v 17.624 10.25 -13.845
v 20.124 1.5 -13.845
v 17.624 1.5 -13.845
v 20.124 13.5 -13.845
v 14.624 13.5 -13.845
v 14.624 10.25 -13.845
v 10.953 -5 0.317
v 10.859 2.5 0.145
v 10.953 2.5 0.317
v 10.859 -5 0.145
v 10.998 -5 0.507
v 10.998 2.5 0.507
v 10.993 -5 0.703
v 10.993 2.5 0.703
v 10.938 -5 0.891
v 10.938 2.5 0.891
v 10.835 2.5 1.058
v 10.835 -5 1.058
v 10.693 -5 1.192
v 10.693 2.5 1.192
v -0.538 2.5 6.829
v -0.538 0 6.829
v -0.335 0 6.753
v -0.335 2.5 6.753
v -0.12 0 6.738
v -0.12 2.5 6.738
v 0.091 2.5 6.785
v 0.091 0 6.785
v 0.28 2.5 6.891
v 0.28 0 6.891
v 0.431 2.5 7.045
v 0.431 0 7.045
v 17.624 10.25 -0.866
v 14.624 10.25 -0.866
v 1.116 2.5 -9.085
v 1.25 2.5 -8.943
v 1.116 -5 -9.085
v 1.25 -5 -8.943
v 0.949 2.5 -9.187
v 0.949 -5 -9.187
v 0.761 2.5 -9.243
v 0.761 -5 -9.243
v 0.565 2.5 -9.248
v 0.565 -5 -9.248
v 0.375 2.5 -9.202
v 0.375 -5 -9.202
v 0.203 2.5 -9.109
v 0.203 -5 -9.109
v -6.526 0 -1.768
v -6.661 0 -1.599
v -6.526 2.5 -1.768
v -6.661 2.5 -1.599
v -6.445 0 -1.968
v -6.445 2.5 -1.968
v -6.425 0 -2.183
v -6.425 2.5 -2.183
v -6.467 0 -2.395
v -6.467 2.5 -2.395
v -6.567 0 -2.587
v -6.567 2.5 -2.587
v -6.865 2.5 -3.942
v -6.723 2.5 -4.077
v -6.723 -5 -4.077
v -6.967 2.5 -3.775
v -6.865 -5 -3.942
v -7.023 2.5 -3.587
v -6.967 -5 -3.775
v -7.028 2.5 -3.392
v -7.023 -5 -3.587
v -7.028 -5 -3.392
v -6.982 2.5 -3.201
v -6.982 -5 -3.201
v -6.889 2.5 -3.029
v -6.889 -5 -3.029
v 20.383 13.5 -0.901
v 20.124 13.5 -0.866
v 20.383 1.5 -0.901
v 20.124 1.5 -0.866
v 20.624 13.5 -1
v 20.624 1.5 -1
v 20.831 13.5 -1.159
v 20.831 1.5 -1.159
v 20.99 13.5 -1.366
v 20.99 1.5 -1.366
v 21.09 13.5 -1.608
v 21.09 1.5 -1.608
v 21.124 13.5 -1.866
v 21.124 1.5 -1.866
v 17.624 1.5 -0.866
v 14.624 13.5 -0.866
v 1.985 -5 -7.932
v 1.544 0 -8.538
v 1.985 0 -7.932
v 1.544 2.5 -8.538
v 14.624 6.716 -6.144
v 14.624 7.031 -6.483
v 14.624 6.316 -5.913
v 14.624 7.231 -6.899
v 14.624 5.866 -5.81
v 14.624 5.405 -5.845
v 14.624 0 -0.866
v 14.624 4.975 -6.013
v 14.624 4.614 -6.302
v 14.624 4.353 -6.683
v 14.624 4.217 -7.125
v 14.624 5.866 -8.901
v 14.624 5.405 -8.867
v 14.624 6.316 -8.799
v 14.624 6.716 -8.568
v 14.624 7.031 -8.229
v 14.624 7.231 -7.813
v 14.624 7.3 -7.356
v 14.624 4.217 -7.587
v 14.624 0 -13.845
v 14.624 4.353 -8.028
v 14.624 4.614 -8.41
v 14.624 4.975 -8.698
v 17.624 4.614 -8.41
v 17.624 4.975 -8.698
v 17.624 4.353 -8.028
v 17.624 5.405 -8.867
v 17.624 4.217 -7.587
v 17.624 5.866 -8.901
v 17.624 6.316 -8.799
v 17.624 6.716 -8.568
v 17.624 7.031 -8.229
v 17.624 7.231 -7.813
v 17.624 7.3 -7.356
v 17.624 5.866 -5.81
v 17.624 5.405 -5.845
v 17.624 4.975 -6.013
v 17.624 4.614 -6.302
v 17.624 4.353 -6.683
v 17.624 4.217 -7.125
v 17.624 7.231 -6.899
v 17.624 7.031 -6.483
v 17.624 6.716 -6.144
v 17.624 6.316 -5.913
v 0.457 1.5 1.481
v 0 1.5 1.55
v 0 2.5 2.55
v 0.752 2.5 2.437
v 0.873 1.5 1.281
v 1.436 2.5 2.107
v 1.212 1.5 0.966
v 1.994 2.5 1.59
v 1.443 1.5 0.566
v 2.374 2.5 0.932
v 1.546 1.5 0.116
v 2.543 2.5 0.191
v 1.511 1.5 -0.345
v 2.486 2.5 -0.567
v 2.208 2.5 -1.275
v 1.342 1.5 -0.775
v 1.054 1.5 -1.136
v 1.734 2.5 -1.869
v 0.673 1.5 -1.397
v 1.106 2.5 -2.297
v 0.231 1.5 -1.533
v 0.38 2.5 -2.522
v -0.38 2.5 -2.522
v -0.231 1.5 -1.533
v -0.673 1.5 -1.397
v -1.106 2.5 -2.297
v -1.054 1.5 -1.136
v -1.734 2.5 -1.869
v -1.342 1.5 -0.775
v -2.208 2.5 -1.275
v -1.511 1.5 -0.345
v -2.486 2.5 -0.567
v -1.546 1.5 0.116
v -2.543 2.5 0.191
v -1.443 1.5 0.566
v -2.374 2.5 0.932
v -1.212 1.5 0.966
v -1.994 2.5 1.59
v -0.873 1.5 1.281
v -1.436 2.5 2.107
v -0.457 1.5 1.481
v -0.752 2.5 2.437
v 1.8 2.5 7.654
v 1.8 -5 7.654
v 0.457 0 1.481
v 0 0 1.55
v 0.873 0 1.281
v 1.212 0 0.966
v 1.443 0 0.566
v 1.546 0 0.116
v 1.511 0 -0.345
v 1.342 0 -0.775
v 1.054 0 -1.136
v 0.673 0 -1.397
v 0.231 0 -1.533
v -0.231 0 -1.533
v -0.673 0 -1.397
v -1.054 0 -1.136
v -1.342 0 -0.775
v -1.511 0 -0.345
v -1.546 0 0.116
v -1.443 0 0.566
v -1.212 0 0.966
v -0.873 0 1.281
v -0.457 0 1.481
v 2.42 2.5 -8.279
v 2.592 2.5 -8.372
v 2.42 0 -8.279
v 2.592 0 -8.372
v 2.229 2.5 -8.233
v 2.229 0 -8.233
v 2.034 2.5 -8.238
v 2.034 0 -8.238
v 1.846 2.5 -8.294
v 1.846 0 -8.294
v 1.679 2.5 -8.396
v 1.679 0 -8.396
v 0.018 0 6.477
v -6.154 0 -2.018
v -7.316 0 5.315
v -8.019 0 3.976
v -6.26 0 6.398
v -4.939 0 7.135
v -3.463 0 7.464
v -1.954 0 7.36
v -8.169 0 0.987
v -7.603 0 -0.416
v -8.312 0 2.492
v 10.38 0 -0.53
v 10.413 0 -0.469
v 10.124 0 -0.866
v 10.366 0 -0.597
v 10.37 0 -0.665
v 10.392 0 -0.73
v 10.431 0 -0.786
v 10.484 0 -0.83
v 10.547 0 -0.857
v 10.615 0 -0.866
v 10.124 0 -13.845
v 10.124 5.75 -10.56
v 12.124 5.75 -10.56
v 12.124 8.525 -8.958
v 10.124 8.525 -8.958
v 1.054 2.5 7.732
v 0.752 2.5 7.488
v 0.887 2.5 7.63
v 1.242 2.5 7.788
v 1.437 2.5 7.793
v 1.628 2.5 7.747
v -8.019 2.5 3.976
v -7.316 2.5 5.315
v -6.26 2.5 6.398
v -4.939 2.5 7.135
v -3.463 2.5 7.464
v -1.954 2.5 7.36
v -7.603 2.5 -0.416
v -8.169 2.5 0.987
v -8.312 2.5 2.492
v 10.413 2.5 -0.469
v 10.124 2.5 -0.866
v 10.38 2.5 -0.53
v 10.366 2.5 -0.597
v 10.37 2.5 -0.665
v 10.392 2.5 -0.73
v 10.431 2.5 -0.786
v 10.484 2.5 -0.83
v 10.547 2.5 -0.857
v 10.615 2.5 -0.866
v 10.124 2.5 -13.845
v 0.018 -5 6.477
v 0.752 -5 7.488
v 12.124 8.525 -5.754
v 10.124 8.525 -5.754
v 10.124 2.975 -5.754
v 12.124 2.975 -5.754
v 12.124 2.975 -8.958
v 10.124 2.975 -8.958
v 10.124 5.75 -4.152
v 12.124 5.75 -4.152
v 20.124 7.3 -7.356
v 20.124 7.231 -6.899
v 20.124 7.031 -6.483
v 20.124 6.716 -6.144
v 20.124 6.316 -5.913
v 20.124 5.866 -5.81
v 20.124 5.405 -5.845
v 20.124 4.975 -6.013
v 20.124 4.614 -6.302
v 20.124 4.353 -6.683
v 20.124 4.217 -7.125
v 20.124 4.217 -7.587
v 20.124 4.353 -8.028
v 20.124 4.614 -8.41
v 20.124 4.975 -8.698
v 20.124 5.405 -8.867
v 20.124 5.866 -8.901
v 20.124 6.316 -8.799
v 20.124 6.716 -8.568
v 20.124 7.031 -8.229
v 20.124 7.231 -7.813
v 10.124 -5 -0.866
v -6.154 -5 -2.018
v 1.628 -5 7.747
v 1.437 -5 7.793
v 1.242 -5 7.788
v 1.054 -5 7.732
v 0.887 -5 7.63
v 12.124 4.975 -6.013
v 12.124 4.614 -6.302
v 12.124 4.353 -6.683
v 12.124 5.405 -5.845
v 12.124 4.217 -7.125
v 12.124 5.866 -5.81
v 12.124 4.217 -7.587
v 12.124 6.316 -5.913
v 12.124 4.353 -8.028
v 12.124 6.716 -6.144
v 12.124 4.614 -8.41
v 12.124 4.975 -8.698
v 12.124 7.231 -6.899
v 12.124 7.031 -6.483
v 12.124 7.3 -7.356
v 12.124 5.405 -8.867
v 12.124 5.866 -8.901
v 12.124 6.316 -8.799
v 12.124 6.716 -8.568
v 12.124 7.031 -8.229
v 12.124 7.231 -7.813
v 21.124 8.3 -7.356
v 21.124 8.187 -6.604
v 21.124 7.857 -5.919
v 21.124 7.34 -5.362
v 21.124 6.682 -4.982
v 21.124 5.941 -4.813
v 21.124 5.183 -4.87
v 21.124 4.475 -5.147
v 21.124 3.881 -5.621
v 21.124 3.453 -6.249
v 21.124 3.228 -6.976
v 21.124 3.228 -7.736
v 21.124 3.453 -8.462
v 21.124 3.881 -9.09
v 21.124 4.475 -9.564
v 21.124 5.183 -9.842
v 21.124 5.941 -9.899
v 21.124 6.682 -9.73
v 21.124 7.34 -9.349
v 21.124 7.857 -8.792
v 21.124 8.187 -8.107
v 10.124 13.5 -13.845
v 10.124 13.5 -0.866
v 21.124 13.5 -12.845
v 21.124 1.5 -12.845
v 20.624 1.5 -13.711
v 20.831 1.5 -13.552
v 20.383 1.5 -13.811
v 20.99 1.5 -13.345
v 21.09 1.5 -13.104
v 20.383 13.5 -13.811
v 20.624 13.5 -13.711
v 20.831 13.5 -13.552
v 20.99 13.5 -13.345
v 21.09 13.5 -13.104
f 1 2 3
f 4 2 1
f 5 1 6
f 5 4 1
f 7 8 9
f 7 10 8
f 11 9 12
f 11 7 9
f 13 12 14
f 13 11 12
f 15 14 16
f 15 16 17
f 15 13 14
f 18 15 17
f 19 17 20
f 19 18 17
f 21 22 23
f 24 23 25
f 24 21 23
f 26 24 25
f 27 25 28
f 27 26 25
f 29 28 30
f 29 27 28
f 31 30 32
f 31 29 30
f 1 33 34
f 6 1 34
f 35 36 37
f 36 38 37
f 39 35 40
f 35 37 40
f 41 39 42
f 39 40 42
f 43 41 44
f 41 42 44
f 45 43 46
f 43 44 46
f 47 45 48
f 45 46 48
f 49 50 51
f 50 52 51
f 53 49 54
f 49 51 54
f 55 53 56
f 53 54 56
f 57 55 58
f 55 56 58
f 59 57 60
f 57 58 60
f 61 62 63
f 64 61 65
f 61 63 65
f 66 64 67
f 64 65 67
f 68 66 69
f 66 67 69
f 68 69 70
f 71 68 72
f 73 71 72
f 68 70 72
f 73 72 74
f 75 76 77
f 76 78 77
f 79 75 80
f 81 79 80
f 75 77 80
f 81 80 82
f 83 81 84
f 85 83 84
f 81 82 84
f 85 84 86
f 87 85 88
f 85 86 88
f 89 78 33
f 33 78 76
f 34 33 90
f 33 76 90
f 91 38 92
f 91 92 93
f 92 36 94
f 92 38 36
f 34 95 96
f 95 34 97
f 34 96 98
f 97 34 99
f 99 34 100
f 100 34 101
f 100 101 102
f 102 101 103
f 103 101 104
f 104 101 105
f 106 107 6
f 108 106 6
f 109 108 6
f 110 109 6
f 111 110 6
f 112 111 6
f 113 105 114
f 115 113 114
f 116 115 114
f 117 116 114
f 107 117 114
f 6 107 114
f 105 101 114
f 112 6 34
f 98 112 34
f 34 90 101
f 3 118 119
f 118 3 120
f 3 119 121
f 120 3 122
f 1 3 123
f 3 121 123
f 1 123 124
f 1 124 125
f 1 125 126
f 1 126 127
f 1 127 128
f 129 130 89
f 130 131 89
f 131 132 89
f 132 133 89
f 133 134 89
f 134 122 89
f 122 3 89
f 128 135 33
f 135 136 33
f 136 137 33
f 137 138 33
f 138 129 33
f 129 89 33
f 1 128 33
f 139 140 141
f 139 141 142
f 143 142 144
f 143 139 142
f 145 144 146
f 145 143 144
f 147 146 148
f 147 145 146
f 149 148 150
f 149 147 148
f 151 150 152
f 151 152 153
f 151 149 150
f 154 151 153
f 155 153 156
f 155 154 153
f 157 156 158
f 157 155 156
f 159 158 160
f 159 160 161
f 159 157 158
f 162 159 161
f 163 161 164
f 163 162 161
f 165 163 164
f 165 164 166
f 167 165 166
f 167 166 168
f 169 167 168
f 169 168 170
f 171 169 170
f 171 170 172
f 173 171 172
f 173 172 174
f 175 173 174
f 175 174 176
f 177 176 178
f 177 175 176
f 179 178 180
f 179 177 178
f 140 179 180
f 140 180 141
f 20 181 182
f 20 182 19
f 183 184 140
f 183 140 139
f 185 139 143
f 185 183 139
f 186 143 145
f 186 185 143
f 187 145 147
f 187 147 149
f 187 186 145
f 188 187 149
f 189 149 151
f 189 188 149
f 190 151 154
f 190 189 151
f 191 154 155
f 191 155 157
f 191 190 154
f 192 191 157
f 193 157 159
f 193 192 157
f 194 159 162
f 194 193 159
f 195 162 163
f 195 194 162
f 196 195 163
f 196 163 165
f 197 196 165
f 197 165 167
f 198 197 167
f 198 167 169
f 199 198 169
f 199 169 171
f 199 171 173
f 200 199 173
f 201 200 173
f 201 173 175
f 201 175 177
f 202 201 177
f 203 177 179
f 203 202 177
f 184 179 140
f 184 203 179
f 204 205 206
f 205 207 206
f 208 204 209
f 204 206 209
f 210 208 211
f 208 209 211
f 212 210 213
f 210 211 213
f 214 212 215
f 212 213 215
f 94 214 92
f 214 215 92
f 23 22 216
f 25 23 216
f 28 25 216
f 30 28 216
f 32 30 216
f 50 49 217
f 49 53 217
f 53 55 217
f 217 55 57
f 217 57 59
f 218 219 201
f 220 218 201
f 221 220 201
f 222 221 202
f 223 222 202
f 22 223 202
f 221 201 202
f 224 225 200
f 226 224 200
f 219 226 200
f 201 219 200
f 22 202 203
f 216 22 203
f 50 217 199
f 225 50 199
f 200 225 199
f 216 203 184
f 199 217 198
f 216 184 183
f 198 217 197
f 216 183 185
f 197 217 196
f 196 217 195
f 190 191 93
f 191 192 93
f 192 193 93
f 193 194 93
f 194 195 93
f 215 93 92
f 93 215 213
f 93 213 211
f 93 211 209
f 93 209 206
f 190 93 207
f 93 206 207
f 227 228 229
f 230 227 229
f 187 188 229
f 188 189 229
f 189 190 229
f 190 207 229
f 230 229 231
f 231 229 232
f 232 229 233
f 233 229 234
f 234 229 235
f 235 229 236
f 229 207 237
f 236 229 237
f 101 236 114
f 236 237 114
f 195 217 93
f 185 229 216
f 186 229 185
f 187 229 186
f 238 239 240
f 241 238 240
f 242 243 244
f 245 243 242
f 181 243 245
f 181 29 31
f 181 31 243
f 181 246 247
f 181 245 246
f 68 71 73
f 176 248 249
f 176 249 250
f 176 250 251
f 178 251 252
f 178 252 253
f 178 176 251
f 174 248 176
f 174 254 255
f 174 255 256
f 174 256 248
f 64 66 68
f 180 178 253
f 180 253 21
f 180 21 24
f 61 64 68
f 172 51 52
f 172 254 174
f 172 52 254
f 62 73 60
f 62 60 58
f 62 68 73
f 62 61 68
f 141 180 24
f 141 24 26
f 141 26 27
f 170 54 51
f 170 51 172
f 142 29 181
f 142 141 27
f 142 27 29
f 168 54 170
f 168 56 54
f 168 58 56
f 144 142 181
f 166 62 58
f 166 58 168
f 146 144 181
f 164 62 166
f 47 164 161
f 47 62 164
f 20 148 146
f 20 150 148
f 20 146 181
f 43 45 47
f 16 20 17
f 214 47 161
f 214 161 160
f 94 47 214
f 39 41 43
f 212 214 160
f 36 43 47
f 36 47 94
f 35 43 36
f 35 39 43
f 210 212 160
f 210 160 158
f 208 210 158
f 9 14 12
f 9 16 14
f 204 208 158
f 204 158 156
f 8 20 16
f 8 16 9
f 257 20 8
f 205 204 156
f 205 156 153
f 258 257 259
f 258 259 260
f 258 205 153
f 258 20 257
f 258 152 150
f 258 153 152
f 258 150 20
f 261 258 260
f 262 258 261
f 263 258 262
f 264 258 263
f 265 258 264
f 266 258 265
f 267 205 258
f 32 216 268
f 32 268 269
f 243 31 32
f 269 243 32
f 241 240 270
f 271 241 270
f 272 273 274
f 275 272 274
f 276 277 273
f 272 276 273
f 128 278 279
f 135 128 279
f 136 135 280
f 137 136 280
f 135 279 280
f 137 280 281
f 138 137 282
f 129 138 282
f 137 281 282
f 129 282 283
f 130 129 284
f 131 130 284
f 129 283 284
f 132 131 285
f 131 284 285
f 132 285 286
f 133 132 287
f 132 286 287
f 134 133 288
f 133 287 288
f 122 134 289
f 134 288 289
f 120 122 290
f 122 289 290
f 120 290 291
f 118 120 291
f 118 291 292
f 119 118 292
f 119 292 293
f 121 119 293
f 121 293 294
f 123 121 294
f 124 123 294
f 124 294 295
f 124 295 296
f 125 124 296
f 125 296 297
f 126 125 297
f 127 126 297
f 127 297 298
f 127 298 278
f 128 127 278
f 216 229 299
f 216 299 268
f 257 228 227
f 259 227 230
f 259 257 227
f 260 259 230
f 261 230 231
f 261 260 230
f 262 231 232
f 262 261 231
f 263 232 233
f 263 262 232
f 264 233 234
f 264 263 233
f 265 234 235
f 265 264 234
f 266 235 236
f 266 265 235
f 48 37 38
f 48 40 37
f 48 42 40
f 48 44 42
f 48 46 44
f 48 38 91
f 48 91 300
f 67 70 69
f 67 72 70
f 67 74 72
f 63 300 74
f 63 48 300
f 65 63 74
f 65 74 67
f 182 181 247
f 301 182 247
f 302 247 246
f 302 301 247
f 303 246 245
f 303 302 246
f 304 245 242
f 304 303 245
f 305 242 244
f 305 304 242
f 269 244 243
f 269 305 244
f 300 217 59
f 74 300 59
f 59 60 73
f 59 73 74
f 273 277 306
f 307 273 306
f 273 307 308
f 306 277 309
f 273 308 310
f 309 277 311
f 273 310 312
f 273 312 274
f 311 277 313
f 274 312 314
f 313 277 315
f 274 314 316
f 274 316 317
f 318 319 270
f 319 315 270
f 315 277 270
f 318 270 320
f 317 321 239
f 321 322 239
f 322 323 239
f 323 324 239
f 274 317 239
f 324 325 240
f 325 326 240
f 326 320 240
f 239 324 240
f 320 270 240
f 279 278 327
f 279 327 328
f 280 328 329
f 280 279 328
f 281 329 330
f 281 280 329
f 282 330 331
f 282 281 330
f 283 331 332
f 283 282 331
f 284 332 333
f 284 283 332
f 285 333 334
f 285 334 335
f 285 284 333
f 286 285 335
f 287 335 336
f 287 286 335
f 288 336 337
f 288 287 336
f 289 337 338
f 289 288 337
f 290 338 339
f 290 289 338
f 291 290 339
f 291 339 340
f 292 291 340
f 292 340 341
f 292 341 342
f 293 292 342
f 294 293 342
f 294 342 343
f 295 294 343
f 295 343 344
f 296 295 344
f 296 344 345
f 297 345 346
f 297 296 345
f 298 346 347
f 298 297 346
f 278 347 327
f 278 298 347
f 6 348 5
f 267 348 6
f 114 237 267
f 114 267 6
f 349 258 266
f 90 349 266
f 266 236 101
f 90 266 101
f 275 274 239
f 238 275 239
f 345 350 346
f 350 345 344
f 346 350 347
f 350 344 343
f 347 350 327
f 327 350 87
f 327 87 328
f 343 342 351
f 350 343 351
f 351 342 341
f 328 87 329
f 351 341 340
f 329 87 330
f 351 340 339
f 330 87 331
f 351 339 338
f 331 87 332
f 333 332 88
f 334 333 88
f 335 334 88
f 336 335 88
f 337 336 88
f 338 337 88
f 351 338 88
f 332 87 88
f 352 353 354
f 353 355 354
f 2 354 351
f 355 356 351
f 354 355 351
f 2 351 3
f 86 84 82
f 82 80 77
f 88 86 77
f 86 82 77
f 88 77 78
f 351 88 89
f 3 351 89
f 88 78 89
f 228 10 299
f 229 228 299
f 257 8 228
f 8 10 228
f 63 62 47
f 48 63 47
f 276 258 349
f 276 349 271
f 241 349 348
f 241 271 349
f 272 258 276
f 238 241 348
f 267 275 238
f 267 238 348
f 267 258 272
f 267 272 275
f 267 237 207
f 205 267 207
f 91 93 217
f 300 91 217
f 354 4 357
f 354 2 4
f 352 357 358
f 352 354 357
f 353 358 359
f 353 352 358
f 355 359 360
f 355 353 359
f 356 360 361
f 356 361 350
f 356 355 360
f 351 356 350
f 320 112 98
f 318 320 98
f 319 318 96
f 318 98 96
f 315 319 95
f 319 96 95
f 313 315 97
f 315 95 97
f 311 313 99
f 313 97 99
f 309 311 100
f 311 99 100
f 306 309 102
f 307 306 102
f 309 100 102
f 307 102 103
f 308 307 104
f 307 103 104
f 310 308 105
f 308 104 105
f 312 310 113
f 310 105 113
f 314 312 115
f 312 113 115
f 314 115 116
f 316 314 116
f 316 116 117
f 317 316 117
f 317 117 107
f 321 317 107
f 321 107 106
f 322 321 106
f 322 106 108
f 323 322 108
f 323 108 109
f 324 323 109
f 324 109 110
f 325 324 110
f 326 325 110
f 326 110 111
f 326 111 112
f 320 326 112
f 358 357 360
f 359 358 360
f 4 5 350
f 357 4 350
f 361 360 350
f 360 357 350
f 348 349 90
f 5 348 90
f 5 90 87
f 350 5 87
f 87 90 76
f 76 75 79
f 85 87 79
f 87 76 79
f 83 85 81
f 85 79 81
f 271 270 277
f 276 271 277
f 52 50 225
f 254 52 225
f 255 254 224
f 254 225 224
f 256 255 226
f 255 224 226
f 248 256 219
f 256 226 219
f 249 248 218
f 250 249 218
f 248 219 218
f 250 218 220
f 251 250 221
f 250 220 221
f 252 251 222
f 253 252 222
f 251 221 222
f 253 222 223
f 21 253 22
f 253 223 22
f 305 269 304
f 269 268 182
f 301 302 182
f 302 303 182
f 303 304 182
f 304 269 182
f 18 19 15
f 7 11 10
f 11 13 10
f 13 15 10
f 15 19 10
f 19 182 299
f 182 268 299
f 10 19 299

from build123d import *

# Parameters (mm, degrees)
SKETCH_1_R             = 1.55
EXTRUDE_386_DEPTH      = 2.5
EXTRUDE_START          = 2.5
EXTRUDE_629_DEPTH      = 7.5
SKETCH_3_W             = 4.5
SKETCH_3_H             = 12.978713764
EXTRUDE_1_DEPTH        = 13.5
EXTRUDE_START_2        = -0.866441
EXTRUDE_2_DEPTH        = 12.978713764
SKETCH_5_R             = 1.55
CUT_EXTRUDE_1293_DEPTH = 36.225185951
CUT_EXTRUDE_START      = -9
SKETCH_5_3_R           = 1.55
CUT_EXTRUDE_1335_DEPTH = 2
CHAMFER_1_SIZE         = 1
FILLET_5_R             = 0.75
FILLET_6_R             = 0.25
FILLET_8_R             = 1


with BuildPart() as part:
    # 草图1 → Extrude 386 (new body)
    with BuildSketch(Plane(origin=(0, 0, 0), x_dir=(1, 0, 0), z_dir=(0, 1, 0))):
        with BuildLine():
            Line((10.1243866, 13.845154317), (-6.15423406, 2.01804411))
            ThreePointArc((-6.15423406, 2.01804411), (-7.315700706, -5.315167685), (0.017511089, -6.476634331))
            Line((0.017511089, -6.476634331), (10.1243866, 0.866440553))
            Line((10.1243866, 0.866440553), (10.1243866, 13.845154317))
        make_face()
        with Locations(Location((0, 0, 0), (0, 0, 270))):
            Circle(SKETCH_1_R, mode=Mode.SUBTRACT)
    extrude(amount=EXTRUDE_386_DEPTH)

    # 草图2 → Extrude 629 (add)
    with BuildSketch(Plane(origin=(0, 0, 0), x_dir=(1, 0, 0), z_dir=(0, 1, 0)).offset(EXTRUDE_START)):
        Polygon((0.017511089, -6.476634331), (1.193081594, -8.09466832), (11.299957105, -0.751593436), (10.1243866, 0.866440553), align=None)
        Polygon((-7.329804565, 3.636078099), (0.809505765, 9.549633202), (1.98507627, 7.931599213), (-6.15423406, 2.01804411), align=None)
    extrude(amount=-EXTRUDE_629_DEPTH)

    # 草图3 → 限位-1 (add)
    with BuildSketch(Plane(origin=(0, 0, 0), x_dir=(1, 0, 0), z_dir=(0, 1, 0))):
        with Locations((12.3743866, 7.355797435)):
            Rectangle(SKETCH_3_W, SKETCH_3_H)
    extrude(amount=EXTRUDE_1_DEPTH)

    # 草图4 → 限位-2 (add)
    with BuildSketch(Plane.XY.offset(EXTRUDE_START_2)):
        Polygon((14.6243866, 13.5), (21.1243866, 13.5), (21.1243866, 1.5), (17.6243866, 1.5), (17.6243866, 10.25), (14.6243866, 10.25), align=None)
    extrude(amount=-EXTRUDE_2_DEPTH)

    # 草图5 → Cut-Extrude 1293 (cut, through all)
    with BuildSketch(Plane(origin=(21.1243866, 0, 0), x_dir=(0, 0, -1), z_dir=(1, 0, 0))):
        with Locations(Location((7.355797435, 5.75, 0), (0, 0, 90))):
            Circle(SKETCH_5_R)
    extrude(amount=-CUT_EXTRUDE_1293_DEPTH, mode=Mode.SUBTRACT)

    # 草图5<3> → Cut-Extrude 1335 (cut)
    with BuildSketch(Plane(origin=(21.1243866, 0, 0), x_dir=(0, 0, -1), z_dir=(1, 0, 0)).offset(CUT_EXTRUDE_START)):
        Polygon((8.957944432, 2.975), (10.560091429, 5.75), (8.957944432, 8.525), (5.753650438, 8.525), (4.151503441, 5.75), (5.753650438, 2.975), align=None)
        with Locations(Location((7.355797435, 5.75, 0), (0, 0, 90))):
            Circle(SKETCH_5_3_R, mode=Mode.SUBTRACT)
    extrude(amount=-CUT_EXTRUDE_1335_DEPTH, mode=Mode.SUBTRACT)

    # 倒角1
    chamfer_1_edges = [part.edges().sort_by_distance(p)[0] for p in [
        (0, 2.5, -1.55),
        (21.1243866, 4.2, -7.355797435),
    ]]
    chamfer(chamfer_1_edges, length=CHAMFER_1_SIZE)

    # 圆角5
    fillet_5_edges = [part.edges().sort_by_distance(p)[0] for p in [
        (11.299957105, -1.25, 0.751593436),
        (1.193081594, -1.25, 8.09466832),
        (1.98507627, 1.25, -7.931599213),
        (-7.329804565, -1.25, -3.636078099),
        (0.809505765, -1.25, -9.549633202),
        (-6.15423406, 1.25, -2.01804411),
        (0.017511089, 1.25, 6.476634331),
    ]]
    fillet(fillet_5_edges, radius=FILLET_5_R)

    # 圆角6
    fillet_6_edges = [part.edges().sort_by_distance(p)[0] for p in [
        (10.1243866, 1.25, -0.866440553),
    ]]
    fillet(fillet_6_edges, radius=FILLET_6_R)

    # 圆角8
    fillet_8_edges = [part.edges().sort_by_distance(p)[0] for p in [
        (21.1243866, 7.5, -13.845154764),
        (21.1243866, 7.5, -0.866441),
    ]]
    fillet(fillet_8_edges, radius=FILLET_8_R)


solid = part.part
